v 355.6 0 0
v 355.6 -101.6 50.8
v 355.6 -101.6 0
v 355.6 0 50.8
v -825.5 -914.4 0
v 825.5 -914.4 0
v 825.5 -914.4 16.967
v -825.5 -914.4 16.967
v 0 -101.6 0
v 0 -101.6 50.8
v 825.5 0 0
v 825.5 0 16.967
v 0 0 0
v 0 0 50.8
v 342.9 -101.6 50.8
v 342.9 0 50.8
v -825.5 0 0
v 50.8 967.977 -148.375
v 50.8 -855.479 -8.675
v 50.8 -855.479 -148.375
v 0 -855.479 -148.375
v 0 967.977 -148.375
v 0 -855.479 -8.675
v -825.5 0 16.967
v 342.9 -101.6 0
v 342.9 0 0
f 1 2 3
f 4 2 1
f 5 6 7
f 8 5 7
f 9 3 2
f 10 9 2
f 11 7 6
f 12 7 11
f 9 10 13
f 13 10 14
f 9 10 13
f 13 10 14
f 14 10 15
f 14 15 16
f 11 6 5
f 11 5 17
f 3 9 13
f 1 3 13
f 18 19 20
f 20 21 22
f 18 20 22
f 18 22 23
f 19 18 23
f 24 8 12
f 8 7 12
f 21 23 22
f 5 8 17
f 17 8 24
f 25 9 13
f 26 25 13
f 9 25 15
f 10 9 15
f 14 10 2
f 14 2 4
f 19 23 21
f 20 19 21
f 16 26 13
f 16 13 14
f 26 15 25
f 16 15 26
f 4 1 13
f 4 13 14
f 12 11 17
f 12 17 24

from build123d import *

# Parameters (mm, degrees)
F0_W     = 914.4
F0_H     = 16.9672
F1_DEPTH = 825.5
F3_DEPTH = 50.8
F4_W     = 101.6
F4_H     = 50.8
F5_DEPTH = 342.9
F6_W     = 101.6
F6_H     = 50.8
F7_DEPTH = 355.6


with BuildPart() as f1:
    # F0 (on Right) → F1 (new body, symmetric)
    with BuildSketch(Plane.YZ):
        with Locations((-457.2, 8.4836)):
            Rectangle(F0_W, F0_H)
    extrude(amount=F1_DEPTH, both=True)


with BuildPart() as f3:
    # F2 (on Right) → F3 (new body)
    with BuildSketch(Plane.YZ):
        Polygon((967.977208, -148.375238), (-855.479222, -8.675238), (-855.479222, -148.375238), align=None)
    extrude(amount=F3_DEPTH)


with BuildPart() as f5:
    # F4 (on Right) → F5 (new body)
    with BuildSketch(Plane.YZ):
        with Locations((-50.8, 25.4)):
            Rectangle(F4_W, F4_H)
    extrude(amount=F5_DEPTH)


with BuildPart() as f7:
    # F6 (on Right) → F7 (new body)
    with BuildSketch(Plane.YZ):
        with Locations((-50.8, 25.4)):
            Rectangle(F6_W, F6_H)
    extrude(amount=F7_DEPTH)


solid = Compound([f1.part, f3.part, f5.part, f7.part])
